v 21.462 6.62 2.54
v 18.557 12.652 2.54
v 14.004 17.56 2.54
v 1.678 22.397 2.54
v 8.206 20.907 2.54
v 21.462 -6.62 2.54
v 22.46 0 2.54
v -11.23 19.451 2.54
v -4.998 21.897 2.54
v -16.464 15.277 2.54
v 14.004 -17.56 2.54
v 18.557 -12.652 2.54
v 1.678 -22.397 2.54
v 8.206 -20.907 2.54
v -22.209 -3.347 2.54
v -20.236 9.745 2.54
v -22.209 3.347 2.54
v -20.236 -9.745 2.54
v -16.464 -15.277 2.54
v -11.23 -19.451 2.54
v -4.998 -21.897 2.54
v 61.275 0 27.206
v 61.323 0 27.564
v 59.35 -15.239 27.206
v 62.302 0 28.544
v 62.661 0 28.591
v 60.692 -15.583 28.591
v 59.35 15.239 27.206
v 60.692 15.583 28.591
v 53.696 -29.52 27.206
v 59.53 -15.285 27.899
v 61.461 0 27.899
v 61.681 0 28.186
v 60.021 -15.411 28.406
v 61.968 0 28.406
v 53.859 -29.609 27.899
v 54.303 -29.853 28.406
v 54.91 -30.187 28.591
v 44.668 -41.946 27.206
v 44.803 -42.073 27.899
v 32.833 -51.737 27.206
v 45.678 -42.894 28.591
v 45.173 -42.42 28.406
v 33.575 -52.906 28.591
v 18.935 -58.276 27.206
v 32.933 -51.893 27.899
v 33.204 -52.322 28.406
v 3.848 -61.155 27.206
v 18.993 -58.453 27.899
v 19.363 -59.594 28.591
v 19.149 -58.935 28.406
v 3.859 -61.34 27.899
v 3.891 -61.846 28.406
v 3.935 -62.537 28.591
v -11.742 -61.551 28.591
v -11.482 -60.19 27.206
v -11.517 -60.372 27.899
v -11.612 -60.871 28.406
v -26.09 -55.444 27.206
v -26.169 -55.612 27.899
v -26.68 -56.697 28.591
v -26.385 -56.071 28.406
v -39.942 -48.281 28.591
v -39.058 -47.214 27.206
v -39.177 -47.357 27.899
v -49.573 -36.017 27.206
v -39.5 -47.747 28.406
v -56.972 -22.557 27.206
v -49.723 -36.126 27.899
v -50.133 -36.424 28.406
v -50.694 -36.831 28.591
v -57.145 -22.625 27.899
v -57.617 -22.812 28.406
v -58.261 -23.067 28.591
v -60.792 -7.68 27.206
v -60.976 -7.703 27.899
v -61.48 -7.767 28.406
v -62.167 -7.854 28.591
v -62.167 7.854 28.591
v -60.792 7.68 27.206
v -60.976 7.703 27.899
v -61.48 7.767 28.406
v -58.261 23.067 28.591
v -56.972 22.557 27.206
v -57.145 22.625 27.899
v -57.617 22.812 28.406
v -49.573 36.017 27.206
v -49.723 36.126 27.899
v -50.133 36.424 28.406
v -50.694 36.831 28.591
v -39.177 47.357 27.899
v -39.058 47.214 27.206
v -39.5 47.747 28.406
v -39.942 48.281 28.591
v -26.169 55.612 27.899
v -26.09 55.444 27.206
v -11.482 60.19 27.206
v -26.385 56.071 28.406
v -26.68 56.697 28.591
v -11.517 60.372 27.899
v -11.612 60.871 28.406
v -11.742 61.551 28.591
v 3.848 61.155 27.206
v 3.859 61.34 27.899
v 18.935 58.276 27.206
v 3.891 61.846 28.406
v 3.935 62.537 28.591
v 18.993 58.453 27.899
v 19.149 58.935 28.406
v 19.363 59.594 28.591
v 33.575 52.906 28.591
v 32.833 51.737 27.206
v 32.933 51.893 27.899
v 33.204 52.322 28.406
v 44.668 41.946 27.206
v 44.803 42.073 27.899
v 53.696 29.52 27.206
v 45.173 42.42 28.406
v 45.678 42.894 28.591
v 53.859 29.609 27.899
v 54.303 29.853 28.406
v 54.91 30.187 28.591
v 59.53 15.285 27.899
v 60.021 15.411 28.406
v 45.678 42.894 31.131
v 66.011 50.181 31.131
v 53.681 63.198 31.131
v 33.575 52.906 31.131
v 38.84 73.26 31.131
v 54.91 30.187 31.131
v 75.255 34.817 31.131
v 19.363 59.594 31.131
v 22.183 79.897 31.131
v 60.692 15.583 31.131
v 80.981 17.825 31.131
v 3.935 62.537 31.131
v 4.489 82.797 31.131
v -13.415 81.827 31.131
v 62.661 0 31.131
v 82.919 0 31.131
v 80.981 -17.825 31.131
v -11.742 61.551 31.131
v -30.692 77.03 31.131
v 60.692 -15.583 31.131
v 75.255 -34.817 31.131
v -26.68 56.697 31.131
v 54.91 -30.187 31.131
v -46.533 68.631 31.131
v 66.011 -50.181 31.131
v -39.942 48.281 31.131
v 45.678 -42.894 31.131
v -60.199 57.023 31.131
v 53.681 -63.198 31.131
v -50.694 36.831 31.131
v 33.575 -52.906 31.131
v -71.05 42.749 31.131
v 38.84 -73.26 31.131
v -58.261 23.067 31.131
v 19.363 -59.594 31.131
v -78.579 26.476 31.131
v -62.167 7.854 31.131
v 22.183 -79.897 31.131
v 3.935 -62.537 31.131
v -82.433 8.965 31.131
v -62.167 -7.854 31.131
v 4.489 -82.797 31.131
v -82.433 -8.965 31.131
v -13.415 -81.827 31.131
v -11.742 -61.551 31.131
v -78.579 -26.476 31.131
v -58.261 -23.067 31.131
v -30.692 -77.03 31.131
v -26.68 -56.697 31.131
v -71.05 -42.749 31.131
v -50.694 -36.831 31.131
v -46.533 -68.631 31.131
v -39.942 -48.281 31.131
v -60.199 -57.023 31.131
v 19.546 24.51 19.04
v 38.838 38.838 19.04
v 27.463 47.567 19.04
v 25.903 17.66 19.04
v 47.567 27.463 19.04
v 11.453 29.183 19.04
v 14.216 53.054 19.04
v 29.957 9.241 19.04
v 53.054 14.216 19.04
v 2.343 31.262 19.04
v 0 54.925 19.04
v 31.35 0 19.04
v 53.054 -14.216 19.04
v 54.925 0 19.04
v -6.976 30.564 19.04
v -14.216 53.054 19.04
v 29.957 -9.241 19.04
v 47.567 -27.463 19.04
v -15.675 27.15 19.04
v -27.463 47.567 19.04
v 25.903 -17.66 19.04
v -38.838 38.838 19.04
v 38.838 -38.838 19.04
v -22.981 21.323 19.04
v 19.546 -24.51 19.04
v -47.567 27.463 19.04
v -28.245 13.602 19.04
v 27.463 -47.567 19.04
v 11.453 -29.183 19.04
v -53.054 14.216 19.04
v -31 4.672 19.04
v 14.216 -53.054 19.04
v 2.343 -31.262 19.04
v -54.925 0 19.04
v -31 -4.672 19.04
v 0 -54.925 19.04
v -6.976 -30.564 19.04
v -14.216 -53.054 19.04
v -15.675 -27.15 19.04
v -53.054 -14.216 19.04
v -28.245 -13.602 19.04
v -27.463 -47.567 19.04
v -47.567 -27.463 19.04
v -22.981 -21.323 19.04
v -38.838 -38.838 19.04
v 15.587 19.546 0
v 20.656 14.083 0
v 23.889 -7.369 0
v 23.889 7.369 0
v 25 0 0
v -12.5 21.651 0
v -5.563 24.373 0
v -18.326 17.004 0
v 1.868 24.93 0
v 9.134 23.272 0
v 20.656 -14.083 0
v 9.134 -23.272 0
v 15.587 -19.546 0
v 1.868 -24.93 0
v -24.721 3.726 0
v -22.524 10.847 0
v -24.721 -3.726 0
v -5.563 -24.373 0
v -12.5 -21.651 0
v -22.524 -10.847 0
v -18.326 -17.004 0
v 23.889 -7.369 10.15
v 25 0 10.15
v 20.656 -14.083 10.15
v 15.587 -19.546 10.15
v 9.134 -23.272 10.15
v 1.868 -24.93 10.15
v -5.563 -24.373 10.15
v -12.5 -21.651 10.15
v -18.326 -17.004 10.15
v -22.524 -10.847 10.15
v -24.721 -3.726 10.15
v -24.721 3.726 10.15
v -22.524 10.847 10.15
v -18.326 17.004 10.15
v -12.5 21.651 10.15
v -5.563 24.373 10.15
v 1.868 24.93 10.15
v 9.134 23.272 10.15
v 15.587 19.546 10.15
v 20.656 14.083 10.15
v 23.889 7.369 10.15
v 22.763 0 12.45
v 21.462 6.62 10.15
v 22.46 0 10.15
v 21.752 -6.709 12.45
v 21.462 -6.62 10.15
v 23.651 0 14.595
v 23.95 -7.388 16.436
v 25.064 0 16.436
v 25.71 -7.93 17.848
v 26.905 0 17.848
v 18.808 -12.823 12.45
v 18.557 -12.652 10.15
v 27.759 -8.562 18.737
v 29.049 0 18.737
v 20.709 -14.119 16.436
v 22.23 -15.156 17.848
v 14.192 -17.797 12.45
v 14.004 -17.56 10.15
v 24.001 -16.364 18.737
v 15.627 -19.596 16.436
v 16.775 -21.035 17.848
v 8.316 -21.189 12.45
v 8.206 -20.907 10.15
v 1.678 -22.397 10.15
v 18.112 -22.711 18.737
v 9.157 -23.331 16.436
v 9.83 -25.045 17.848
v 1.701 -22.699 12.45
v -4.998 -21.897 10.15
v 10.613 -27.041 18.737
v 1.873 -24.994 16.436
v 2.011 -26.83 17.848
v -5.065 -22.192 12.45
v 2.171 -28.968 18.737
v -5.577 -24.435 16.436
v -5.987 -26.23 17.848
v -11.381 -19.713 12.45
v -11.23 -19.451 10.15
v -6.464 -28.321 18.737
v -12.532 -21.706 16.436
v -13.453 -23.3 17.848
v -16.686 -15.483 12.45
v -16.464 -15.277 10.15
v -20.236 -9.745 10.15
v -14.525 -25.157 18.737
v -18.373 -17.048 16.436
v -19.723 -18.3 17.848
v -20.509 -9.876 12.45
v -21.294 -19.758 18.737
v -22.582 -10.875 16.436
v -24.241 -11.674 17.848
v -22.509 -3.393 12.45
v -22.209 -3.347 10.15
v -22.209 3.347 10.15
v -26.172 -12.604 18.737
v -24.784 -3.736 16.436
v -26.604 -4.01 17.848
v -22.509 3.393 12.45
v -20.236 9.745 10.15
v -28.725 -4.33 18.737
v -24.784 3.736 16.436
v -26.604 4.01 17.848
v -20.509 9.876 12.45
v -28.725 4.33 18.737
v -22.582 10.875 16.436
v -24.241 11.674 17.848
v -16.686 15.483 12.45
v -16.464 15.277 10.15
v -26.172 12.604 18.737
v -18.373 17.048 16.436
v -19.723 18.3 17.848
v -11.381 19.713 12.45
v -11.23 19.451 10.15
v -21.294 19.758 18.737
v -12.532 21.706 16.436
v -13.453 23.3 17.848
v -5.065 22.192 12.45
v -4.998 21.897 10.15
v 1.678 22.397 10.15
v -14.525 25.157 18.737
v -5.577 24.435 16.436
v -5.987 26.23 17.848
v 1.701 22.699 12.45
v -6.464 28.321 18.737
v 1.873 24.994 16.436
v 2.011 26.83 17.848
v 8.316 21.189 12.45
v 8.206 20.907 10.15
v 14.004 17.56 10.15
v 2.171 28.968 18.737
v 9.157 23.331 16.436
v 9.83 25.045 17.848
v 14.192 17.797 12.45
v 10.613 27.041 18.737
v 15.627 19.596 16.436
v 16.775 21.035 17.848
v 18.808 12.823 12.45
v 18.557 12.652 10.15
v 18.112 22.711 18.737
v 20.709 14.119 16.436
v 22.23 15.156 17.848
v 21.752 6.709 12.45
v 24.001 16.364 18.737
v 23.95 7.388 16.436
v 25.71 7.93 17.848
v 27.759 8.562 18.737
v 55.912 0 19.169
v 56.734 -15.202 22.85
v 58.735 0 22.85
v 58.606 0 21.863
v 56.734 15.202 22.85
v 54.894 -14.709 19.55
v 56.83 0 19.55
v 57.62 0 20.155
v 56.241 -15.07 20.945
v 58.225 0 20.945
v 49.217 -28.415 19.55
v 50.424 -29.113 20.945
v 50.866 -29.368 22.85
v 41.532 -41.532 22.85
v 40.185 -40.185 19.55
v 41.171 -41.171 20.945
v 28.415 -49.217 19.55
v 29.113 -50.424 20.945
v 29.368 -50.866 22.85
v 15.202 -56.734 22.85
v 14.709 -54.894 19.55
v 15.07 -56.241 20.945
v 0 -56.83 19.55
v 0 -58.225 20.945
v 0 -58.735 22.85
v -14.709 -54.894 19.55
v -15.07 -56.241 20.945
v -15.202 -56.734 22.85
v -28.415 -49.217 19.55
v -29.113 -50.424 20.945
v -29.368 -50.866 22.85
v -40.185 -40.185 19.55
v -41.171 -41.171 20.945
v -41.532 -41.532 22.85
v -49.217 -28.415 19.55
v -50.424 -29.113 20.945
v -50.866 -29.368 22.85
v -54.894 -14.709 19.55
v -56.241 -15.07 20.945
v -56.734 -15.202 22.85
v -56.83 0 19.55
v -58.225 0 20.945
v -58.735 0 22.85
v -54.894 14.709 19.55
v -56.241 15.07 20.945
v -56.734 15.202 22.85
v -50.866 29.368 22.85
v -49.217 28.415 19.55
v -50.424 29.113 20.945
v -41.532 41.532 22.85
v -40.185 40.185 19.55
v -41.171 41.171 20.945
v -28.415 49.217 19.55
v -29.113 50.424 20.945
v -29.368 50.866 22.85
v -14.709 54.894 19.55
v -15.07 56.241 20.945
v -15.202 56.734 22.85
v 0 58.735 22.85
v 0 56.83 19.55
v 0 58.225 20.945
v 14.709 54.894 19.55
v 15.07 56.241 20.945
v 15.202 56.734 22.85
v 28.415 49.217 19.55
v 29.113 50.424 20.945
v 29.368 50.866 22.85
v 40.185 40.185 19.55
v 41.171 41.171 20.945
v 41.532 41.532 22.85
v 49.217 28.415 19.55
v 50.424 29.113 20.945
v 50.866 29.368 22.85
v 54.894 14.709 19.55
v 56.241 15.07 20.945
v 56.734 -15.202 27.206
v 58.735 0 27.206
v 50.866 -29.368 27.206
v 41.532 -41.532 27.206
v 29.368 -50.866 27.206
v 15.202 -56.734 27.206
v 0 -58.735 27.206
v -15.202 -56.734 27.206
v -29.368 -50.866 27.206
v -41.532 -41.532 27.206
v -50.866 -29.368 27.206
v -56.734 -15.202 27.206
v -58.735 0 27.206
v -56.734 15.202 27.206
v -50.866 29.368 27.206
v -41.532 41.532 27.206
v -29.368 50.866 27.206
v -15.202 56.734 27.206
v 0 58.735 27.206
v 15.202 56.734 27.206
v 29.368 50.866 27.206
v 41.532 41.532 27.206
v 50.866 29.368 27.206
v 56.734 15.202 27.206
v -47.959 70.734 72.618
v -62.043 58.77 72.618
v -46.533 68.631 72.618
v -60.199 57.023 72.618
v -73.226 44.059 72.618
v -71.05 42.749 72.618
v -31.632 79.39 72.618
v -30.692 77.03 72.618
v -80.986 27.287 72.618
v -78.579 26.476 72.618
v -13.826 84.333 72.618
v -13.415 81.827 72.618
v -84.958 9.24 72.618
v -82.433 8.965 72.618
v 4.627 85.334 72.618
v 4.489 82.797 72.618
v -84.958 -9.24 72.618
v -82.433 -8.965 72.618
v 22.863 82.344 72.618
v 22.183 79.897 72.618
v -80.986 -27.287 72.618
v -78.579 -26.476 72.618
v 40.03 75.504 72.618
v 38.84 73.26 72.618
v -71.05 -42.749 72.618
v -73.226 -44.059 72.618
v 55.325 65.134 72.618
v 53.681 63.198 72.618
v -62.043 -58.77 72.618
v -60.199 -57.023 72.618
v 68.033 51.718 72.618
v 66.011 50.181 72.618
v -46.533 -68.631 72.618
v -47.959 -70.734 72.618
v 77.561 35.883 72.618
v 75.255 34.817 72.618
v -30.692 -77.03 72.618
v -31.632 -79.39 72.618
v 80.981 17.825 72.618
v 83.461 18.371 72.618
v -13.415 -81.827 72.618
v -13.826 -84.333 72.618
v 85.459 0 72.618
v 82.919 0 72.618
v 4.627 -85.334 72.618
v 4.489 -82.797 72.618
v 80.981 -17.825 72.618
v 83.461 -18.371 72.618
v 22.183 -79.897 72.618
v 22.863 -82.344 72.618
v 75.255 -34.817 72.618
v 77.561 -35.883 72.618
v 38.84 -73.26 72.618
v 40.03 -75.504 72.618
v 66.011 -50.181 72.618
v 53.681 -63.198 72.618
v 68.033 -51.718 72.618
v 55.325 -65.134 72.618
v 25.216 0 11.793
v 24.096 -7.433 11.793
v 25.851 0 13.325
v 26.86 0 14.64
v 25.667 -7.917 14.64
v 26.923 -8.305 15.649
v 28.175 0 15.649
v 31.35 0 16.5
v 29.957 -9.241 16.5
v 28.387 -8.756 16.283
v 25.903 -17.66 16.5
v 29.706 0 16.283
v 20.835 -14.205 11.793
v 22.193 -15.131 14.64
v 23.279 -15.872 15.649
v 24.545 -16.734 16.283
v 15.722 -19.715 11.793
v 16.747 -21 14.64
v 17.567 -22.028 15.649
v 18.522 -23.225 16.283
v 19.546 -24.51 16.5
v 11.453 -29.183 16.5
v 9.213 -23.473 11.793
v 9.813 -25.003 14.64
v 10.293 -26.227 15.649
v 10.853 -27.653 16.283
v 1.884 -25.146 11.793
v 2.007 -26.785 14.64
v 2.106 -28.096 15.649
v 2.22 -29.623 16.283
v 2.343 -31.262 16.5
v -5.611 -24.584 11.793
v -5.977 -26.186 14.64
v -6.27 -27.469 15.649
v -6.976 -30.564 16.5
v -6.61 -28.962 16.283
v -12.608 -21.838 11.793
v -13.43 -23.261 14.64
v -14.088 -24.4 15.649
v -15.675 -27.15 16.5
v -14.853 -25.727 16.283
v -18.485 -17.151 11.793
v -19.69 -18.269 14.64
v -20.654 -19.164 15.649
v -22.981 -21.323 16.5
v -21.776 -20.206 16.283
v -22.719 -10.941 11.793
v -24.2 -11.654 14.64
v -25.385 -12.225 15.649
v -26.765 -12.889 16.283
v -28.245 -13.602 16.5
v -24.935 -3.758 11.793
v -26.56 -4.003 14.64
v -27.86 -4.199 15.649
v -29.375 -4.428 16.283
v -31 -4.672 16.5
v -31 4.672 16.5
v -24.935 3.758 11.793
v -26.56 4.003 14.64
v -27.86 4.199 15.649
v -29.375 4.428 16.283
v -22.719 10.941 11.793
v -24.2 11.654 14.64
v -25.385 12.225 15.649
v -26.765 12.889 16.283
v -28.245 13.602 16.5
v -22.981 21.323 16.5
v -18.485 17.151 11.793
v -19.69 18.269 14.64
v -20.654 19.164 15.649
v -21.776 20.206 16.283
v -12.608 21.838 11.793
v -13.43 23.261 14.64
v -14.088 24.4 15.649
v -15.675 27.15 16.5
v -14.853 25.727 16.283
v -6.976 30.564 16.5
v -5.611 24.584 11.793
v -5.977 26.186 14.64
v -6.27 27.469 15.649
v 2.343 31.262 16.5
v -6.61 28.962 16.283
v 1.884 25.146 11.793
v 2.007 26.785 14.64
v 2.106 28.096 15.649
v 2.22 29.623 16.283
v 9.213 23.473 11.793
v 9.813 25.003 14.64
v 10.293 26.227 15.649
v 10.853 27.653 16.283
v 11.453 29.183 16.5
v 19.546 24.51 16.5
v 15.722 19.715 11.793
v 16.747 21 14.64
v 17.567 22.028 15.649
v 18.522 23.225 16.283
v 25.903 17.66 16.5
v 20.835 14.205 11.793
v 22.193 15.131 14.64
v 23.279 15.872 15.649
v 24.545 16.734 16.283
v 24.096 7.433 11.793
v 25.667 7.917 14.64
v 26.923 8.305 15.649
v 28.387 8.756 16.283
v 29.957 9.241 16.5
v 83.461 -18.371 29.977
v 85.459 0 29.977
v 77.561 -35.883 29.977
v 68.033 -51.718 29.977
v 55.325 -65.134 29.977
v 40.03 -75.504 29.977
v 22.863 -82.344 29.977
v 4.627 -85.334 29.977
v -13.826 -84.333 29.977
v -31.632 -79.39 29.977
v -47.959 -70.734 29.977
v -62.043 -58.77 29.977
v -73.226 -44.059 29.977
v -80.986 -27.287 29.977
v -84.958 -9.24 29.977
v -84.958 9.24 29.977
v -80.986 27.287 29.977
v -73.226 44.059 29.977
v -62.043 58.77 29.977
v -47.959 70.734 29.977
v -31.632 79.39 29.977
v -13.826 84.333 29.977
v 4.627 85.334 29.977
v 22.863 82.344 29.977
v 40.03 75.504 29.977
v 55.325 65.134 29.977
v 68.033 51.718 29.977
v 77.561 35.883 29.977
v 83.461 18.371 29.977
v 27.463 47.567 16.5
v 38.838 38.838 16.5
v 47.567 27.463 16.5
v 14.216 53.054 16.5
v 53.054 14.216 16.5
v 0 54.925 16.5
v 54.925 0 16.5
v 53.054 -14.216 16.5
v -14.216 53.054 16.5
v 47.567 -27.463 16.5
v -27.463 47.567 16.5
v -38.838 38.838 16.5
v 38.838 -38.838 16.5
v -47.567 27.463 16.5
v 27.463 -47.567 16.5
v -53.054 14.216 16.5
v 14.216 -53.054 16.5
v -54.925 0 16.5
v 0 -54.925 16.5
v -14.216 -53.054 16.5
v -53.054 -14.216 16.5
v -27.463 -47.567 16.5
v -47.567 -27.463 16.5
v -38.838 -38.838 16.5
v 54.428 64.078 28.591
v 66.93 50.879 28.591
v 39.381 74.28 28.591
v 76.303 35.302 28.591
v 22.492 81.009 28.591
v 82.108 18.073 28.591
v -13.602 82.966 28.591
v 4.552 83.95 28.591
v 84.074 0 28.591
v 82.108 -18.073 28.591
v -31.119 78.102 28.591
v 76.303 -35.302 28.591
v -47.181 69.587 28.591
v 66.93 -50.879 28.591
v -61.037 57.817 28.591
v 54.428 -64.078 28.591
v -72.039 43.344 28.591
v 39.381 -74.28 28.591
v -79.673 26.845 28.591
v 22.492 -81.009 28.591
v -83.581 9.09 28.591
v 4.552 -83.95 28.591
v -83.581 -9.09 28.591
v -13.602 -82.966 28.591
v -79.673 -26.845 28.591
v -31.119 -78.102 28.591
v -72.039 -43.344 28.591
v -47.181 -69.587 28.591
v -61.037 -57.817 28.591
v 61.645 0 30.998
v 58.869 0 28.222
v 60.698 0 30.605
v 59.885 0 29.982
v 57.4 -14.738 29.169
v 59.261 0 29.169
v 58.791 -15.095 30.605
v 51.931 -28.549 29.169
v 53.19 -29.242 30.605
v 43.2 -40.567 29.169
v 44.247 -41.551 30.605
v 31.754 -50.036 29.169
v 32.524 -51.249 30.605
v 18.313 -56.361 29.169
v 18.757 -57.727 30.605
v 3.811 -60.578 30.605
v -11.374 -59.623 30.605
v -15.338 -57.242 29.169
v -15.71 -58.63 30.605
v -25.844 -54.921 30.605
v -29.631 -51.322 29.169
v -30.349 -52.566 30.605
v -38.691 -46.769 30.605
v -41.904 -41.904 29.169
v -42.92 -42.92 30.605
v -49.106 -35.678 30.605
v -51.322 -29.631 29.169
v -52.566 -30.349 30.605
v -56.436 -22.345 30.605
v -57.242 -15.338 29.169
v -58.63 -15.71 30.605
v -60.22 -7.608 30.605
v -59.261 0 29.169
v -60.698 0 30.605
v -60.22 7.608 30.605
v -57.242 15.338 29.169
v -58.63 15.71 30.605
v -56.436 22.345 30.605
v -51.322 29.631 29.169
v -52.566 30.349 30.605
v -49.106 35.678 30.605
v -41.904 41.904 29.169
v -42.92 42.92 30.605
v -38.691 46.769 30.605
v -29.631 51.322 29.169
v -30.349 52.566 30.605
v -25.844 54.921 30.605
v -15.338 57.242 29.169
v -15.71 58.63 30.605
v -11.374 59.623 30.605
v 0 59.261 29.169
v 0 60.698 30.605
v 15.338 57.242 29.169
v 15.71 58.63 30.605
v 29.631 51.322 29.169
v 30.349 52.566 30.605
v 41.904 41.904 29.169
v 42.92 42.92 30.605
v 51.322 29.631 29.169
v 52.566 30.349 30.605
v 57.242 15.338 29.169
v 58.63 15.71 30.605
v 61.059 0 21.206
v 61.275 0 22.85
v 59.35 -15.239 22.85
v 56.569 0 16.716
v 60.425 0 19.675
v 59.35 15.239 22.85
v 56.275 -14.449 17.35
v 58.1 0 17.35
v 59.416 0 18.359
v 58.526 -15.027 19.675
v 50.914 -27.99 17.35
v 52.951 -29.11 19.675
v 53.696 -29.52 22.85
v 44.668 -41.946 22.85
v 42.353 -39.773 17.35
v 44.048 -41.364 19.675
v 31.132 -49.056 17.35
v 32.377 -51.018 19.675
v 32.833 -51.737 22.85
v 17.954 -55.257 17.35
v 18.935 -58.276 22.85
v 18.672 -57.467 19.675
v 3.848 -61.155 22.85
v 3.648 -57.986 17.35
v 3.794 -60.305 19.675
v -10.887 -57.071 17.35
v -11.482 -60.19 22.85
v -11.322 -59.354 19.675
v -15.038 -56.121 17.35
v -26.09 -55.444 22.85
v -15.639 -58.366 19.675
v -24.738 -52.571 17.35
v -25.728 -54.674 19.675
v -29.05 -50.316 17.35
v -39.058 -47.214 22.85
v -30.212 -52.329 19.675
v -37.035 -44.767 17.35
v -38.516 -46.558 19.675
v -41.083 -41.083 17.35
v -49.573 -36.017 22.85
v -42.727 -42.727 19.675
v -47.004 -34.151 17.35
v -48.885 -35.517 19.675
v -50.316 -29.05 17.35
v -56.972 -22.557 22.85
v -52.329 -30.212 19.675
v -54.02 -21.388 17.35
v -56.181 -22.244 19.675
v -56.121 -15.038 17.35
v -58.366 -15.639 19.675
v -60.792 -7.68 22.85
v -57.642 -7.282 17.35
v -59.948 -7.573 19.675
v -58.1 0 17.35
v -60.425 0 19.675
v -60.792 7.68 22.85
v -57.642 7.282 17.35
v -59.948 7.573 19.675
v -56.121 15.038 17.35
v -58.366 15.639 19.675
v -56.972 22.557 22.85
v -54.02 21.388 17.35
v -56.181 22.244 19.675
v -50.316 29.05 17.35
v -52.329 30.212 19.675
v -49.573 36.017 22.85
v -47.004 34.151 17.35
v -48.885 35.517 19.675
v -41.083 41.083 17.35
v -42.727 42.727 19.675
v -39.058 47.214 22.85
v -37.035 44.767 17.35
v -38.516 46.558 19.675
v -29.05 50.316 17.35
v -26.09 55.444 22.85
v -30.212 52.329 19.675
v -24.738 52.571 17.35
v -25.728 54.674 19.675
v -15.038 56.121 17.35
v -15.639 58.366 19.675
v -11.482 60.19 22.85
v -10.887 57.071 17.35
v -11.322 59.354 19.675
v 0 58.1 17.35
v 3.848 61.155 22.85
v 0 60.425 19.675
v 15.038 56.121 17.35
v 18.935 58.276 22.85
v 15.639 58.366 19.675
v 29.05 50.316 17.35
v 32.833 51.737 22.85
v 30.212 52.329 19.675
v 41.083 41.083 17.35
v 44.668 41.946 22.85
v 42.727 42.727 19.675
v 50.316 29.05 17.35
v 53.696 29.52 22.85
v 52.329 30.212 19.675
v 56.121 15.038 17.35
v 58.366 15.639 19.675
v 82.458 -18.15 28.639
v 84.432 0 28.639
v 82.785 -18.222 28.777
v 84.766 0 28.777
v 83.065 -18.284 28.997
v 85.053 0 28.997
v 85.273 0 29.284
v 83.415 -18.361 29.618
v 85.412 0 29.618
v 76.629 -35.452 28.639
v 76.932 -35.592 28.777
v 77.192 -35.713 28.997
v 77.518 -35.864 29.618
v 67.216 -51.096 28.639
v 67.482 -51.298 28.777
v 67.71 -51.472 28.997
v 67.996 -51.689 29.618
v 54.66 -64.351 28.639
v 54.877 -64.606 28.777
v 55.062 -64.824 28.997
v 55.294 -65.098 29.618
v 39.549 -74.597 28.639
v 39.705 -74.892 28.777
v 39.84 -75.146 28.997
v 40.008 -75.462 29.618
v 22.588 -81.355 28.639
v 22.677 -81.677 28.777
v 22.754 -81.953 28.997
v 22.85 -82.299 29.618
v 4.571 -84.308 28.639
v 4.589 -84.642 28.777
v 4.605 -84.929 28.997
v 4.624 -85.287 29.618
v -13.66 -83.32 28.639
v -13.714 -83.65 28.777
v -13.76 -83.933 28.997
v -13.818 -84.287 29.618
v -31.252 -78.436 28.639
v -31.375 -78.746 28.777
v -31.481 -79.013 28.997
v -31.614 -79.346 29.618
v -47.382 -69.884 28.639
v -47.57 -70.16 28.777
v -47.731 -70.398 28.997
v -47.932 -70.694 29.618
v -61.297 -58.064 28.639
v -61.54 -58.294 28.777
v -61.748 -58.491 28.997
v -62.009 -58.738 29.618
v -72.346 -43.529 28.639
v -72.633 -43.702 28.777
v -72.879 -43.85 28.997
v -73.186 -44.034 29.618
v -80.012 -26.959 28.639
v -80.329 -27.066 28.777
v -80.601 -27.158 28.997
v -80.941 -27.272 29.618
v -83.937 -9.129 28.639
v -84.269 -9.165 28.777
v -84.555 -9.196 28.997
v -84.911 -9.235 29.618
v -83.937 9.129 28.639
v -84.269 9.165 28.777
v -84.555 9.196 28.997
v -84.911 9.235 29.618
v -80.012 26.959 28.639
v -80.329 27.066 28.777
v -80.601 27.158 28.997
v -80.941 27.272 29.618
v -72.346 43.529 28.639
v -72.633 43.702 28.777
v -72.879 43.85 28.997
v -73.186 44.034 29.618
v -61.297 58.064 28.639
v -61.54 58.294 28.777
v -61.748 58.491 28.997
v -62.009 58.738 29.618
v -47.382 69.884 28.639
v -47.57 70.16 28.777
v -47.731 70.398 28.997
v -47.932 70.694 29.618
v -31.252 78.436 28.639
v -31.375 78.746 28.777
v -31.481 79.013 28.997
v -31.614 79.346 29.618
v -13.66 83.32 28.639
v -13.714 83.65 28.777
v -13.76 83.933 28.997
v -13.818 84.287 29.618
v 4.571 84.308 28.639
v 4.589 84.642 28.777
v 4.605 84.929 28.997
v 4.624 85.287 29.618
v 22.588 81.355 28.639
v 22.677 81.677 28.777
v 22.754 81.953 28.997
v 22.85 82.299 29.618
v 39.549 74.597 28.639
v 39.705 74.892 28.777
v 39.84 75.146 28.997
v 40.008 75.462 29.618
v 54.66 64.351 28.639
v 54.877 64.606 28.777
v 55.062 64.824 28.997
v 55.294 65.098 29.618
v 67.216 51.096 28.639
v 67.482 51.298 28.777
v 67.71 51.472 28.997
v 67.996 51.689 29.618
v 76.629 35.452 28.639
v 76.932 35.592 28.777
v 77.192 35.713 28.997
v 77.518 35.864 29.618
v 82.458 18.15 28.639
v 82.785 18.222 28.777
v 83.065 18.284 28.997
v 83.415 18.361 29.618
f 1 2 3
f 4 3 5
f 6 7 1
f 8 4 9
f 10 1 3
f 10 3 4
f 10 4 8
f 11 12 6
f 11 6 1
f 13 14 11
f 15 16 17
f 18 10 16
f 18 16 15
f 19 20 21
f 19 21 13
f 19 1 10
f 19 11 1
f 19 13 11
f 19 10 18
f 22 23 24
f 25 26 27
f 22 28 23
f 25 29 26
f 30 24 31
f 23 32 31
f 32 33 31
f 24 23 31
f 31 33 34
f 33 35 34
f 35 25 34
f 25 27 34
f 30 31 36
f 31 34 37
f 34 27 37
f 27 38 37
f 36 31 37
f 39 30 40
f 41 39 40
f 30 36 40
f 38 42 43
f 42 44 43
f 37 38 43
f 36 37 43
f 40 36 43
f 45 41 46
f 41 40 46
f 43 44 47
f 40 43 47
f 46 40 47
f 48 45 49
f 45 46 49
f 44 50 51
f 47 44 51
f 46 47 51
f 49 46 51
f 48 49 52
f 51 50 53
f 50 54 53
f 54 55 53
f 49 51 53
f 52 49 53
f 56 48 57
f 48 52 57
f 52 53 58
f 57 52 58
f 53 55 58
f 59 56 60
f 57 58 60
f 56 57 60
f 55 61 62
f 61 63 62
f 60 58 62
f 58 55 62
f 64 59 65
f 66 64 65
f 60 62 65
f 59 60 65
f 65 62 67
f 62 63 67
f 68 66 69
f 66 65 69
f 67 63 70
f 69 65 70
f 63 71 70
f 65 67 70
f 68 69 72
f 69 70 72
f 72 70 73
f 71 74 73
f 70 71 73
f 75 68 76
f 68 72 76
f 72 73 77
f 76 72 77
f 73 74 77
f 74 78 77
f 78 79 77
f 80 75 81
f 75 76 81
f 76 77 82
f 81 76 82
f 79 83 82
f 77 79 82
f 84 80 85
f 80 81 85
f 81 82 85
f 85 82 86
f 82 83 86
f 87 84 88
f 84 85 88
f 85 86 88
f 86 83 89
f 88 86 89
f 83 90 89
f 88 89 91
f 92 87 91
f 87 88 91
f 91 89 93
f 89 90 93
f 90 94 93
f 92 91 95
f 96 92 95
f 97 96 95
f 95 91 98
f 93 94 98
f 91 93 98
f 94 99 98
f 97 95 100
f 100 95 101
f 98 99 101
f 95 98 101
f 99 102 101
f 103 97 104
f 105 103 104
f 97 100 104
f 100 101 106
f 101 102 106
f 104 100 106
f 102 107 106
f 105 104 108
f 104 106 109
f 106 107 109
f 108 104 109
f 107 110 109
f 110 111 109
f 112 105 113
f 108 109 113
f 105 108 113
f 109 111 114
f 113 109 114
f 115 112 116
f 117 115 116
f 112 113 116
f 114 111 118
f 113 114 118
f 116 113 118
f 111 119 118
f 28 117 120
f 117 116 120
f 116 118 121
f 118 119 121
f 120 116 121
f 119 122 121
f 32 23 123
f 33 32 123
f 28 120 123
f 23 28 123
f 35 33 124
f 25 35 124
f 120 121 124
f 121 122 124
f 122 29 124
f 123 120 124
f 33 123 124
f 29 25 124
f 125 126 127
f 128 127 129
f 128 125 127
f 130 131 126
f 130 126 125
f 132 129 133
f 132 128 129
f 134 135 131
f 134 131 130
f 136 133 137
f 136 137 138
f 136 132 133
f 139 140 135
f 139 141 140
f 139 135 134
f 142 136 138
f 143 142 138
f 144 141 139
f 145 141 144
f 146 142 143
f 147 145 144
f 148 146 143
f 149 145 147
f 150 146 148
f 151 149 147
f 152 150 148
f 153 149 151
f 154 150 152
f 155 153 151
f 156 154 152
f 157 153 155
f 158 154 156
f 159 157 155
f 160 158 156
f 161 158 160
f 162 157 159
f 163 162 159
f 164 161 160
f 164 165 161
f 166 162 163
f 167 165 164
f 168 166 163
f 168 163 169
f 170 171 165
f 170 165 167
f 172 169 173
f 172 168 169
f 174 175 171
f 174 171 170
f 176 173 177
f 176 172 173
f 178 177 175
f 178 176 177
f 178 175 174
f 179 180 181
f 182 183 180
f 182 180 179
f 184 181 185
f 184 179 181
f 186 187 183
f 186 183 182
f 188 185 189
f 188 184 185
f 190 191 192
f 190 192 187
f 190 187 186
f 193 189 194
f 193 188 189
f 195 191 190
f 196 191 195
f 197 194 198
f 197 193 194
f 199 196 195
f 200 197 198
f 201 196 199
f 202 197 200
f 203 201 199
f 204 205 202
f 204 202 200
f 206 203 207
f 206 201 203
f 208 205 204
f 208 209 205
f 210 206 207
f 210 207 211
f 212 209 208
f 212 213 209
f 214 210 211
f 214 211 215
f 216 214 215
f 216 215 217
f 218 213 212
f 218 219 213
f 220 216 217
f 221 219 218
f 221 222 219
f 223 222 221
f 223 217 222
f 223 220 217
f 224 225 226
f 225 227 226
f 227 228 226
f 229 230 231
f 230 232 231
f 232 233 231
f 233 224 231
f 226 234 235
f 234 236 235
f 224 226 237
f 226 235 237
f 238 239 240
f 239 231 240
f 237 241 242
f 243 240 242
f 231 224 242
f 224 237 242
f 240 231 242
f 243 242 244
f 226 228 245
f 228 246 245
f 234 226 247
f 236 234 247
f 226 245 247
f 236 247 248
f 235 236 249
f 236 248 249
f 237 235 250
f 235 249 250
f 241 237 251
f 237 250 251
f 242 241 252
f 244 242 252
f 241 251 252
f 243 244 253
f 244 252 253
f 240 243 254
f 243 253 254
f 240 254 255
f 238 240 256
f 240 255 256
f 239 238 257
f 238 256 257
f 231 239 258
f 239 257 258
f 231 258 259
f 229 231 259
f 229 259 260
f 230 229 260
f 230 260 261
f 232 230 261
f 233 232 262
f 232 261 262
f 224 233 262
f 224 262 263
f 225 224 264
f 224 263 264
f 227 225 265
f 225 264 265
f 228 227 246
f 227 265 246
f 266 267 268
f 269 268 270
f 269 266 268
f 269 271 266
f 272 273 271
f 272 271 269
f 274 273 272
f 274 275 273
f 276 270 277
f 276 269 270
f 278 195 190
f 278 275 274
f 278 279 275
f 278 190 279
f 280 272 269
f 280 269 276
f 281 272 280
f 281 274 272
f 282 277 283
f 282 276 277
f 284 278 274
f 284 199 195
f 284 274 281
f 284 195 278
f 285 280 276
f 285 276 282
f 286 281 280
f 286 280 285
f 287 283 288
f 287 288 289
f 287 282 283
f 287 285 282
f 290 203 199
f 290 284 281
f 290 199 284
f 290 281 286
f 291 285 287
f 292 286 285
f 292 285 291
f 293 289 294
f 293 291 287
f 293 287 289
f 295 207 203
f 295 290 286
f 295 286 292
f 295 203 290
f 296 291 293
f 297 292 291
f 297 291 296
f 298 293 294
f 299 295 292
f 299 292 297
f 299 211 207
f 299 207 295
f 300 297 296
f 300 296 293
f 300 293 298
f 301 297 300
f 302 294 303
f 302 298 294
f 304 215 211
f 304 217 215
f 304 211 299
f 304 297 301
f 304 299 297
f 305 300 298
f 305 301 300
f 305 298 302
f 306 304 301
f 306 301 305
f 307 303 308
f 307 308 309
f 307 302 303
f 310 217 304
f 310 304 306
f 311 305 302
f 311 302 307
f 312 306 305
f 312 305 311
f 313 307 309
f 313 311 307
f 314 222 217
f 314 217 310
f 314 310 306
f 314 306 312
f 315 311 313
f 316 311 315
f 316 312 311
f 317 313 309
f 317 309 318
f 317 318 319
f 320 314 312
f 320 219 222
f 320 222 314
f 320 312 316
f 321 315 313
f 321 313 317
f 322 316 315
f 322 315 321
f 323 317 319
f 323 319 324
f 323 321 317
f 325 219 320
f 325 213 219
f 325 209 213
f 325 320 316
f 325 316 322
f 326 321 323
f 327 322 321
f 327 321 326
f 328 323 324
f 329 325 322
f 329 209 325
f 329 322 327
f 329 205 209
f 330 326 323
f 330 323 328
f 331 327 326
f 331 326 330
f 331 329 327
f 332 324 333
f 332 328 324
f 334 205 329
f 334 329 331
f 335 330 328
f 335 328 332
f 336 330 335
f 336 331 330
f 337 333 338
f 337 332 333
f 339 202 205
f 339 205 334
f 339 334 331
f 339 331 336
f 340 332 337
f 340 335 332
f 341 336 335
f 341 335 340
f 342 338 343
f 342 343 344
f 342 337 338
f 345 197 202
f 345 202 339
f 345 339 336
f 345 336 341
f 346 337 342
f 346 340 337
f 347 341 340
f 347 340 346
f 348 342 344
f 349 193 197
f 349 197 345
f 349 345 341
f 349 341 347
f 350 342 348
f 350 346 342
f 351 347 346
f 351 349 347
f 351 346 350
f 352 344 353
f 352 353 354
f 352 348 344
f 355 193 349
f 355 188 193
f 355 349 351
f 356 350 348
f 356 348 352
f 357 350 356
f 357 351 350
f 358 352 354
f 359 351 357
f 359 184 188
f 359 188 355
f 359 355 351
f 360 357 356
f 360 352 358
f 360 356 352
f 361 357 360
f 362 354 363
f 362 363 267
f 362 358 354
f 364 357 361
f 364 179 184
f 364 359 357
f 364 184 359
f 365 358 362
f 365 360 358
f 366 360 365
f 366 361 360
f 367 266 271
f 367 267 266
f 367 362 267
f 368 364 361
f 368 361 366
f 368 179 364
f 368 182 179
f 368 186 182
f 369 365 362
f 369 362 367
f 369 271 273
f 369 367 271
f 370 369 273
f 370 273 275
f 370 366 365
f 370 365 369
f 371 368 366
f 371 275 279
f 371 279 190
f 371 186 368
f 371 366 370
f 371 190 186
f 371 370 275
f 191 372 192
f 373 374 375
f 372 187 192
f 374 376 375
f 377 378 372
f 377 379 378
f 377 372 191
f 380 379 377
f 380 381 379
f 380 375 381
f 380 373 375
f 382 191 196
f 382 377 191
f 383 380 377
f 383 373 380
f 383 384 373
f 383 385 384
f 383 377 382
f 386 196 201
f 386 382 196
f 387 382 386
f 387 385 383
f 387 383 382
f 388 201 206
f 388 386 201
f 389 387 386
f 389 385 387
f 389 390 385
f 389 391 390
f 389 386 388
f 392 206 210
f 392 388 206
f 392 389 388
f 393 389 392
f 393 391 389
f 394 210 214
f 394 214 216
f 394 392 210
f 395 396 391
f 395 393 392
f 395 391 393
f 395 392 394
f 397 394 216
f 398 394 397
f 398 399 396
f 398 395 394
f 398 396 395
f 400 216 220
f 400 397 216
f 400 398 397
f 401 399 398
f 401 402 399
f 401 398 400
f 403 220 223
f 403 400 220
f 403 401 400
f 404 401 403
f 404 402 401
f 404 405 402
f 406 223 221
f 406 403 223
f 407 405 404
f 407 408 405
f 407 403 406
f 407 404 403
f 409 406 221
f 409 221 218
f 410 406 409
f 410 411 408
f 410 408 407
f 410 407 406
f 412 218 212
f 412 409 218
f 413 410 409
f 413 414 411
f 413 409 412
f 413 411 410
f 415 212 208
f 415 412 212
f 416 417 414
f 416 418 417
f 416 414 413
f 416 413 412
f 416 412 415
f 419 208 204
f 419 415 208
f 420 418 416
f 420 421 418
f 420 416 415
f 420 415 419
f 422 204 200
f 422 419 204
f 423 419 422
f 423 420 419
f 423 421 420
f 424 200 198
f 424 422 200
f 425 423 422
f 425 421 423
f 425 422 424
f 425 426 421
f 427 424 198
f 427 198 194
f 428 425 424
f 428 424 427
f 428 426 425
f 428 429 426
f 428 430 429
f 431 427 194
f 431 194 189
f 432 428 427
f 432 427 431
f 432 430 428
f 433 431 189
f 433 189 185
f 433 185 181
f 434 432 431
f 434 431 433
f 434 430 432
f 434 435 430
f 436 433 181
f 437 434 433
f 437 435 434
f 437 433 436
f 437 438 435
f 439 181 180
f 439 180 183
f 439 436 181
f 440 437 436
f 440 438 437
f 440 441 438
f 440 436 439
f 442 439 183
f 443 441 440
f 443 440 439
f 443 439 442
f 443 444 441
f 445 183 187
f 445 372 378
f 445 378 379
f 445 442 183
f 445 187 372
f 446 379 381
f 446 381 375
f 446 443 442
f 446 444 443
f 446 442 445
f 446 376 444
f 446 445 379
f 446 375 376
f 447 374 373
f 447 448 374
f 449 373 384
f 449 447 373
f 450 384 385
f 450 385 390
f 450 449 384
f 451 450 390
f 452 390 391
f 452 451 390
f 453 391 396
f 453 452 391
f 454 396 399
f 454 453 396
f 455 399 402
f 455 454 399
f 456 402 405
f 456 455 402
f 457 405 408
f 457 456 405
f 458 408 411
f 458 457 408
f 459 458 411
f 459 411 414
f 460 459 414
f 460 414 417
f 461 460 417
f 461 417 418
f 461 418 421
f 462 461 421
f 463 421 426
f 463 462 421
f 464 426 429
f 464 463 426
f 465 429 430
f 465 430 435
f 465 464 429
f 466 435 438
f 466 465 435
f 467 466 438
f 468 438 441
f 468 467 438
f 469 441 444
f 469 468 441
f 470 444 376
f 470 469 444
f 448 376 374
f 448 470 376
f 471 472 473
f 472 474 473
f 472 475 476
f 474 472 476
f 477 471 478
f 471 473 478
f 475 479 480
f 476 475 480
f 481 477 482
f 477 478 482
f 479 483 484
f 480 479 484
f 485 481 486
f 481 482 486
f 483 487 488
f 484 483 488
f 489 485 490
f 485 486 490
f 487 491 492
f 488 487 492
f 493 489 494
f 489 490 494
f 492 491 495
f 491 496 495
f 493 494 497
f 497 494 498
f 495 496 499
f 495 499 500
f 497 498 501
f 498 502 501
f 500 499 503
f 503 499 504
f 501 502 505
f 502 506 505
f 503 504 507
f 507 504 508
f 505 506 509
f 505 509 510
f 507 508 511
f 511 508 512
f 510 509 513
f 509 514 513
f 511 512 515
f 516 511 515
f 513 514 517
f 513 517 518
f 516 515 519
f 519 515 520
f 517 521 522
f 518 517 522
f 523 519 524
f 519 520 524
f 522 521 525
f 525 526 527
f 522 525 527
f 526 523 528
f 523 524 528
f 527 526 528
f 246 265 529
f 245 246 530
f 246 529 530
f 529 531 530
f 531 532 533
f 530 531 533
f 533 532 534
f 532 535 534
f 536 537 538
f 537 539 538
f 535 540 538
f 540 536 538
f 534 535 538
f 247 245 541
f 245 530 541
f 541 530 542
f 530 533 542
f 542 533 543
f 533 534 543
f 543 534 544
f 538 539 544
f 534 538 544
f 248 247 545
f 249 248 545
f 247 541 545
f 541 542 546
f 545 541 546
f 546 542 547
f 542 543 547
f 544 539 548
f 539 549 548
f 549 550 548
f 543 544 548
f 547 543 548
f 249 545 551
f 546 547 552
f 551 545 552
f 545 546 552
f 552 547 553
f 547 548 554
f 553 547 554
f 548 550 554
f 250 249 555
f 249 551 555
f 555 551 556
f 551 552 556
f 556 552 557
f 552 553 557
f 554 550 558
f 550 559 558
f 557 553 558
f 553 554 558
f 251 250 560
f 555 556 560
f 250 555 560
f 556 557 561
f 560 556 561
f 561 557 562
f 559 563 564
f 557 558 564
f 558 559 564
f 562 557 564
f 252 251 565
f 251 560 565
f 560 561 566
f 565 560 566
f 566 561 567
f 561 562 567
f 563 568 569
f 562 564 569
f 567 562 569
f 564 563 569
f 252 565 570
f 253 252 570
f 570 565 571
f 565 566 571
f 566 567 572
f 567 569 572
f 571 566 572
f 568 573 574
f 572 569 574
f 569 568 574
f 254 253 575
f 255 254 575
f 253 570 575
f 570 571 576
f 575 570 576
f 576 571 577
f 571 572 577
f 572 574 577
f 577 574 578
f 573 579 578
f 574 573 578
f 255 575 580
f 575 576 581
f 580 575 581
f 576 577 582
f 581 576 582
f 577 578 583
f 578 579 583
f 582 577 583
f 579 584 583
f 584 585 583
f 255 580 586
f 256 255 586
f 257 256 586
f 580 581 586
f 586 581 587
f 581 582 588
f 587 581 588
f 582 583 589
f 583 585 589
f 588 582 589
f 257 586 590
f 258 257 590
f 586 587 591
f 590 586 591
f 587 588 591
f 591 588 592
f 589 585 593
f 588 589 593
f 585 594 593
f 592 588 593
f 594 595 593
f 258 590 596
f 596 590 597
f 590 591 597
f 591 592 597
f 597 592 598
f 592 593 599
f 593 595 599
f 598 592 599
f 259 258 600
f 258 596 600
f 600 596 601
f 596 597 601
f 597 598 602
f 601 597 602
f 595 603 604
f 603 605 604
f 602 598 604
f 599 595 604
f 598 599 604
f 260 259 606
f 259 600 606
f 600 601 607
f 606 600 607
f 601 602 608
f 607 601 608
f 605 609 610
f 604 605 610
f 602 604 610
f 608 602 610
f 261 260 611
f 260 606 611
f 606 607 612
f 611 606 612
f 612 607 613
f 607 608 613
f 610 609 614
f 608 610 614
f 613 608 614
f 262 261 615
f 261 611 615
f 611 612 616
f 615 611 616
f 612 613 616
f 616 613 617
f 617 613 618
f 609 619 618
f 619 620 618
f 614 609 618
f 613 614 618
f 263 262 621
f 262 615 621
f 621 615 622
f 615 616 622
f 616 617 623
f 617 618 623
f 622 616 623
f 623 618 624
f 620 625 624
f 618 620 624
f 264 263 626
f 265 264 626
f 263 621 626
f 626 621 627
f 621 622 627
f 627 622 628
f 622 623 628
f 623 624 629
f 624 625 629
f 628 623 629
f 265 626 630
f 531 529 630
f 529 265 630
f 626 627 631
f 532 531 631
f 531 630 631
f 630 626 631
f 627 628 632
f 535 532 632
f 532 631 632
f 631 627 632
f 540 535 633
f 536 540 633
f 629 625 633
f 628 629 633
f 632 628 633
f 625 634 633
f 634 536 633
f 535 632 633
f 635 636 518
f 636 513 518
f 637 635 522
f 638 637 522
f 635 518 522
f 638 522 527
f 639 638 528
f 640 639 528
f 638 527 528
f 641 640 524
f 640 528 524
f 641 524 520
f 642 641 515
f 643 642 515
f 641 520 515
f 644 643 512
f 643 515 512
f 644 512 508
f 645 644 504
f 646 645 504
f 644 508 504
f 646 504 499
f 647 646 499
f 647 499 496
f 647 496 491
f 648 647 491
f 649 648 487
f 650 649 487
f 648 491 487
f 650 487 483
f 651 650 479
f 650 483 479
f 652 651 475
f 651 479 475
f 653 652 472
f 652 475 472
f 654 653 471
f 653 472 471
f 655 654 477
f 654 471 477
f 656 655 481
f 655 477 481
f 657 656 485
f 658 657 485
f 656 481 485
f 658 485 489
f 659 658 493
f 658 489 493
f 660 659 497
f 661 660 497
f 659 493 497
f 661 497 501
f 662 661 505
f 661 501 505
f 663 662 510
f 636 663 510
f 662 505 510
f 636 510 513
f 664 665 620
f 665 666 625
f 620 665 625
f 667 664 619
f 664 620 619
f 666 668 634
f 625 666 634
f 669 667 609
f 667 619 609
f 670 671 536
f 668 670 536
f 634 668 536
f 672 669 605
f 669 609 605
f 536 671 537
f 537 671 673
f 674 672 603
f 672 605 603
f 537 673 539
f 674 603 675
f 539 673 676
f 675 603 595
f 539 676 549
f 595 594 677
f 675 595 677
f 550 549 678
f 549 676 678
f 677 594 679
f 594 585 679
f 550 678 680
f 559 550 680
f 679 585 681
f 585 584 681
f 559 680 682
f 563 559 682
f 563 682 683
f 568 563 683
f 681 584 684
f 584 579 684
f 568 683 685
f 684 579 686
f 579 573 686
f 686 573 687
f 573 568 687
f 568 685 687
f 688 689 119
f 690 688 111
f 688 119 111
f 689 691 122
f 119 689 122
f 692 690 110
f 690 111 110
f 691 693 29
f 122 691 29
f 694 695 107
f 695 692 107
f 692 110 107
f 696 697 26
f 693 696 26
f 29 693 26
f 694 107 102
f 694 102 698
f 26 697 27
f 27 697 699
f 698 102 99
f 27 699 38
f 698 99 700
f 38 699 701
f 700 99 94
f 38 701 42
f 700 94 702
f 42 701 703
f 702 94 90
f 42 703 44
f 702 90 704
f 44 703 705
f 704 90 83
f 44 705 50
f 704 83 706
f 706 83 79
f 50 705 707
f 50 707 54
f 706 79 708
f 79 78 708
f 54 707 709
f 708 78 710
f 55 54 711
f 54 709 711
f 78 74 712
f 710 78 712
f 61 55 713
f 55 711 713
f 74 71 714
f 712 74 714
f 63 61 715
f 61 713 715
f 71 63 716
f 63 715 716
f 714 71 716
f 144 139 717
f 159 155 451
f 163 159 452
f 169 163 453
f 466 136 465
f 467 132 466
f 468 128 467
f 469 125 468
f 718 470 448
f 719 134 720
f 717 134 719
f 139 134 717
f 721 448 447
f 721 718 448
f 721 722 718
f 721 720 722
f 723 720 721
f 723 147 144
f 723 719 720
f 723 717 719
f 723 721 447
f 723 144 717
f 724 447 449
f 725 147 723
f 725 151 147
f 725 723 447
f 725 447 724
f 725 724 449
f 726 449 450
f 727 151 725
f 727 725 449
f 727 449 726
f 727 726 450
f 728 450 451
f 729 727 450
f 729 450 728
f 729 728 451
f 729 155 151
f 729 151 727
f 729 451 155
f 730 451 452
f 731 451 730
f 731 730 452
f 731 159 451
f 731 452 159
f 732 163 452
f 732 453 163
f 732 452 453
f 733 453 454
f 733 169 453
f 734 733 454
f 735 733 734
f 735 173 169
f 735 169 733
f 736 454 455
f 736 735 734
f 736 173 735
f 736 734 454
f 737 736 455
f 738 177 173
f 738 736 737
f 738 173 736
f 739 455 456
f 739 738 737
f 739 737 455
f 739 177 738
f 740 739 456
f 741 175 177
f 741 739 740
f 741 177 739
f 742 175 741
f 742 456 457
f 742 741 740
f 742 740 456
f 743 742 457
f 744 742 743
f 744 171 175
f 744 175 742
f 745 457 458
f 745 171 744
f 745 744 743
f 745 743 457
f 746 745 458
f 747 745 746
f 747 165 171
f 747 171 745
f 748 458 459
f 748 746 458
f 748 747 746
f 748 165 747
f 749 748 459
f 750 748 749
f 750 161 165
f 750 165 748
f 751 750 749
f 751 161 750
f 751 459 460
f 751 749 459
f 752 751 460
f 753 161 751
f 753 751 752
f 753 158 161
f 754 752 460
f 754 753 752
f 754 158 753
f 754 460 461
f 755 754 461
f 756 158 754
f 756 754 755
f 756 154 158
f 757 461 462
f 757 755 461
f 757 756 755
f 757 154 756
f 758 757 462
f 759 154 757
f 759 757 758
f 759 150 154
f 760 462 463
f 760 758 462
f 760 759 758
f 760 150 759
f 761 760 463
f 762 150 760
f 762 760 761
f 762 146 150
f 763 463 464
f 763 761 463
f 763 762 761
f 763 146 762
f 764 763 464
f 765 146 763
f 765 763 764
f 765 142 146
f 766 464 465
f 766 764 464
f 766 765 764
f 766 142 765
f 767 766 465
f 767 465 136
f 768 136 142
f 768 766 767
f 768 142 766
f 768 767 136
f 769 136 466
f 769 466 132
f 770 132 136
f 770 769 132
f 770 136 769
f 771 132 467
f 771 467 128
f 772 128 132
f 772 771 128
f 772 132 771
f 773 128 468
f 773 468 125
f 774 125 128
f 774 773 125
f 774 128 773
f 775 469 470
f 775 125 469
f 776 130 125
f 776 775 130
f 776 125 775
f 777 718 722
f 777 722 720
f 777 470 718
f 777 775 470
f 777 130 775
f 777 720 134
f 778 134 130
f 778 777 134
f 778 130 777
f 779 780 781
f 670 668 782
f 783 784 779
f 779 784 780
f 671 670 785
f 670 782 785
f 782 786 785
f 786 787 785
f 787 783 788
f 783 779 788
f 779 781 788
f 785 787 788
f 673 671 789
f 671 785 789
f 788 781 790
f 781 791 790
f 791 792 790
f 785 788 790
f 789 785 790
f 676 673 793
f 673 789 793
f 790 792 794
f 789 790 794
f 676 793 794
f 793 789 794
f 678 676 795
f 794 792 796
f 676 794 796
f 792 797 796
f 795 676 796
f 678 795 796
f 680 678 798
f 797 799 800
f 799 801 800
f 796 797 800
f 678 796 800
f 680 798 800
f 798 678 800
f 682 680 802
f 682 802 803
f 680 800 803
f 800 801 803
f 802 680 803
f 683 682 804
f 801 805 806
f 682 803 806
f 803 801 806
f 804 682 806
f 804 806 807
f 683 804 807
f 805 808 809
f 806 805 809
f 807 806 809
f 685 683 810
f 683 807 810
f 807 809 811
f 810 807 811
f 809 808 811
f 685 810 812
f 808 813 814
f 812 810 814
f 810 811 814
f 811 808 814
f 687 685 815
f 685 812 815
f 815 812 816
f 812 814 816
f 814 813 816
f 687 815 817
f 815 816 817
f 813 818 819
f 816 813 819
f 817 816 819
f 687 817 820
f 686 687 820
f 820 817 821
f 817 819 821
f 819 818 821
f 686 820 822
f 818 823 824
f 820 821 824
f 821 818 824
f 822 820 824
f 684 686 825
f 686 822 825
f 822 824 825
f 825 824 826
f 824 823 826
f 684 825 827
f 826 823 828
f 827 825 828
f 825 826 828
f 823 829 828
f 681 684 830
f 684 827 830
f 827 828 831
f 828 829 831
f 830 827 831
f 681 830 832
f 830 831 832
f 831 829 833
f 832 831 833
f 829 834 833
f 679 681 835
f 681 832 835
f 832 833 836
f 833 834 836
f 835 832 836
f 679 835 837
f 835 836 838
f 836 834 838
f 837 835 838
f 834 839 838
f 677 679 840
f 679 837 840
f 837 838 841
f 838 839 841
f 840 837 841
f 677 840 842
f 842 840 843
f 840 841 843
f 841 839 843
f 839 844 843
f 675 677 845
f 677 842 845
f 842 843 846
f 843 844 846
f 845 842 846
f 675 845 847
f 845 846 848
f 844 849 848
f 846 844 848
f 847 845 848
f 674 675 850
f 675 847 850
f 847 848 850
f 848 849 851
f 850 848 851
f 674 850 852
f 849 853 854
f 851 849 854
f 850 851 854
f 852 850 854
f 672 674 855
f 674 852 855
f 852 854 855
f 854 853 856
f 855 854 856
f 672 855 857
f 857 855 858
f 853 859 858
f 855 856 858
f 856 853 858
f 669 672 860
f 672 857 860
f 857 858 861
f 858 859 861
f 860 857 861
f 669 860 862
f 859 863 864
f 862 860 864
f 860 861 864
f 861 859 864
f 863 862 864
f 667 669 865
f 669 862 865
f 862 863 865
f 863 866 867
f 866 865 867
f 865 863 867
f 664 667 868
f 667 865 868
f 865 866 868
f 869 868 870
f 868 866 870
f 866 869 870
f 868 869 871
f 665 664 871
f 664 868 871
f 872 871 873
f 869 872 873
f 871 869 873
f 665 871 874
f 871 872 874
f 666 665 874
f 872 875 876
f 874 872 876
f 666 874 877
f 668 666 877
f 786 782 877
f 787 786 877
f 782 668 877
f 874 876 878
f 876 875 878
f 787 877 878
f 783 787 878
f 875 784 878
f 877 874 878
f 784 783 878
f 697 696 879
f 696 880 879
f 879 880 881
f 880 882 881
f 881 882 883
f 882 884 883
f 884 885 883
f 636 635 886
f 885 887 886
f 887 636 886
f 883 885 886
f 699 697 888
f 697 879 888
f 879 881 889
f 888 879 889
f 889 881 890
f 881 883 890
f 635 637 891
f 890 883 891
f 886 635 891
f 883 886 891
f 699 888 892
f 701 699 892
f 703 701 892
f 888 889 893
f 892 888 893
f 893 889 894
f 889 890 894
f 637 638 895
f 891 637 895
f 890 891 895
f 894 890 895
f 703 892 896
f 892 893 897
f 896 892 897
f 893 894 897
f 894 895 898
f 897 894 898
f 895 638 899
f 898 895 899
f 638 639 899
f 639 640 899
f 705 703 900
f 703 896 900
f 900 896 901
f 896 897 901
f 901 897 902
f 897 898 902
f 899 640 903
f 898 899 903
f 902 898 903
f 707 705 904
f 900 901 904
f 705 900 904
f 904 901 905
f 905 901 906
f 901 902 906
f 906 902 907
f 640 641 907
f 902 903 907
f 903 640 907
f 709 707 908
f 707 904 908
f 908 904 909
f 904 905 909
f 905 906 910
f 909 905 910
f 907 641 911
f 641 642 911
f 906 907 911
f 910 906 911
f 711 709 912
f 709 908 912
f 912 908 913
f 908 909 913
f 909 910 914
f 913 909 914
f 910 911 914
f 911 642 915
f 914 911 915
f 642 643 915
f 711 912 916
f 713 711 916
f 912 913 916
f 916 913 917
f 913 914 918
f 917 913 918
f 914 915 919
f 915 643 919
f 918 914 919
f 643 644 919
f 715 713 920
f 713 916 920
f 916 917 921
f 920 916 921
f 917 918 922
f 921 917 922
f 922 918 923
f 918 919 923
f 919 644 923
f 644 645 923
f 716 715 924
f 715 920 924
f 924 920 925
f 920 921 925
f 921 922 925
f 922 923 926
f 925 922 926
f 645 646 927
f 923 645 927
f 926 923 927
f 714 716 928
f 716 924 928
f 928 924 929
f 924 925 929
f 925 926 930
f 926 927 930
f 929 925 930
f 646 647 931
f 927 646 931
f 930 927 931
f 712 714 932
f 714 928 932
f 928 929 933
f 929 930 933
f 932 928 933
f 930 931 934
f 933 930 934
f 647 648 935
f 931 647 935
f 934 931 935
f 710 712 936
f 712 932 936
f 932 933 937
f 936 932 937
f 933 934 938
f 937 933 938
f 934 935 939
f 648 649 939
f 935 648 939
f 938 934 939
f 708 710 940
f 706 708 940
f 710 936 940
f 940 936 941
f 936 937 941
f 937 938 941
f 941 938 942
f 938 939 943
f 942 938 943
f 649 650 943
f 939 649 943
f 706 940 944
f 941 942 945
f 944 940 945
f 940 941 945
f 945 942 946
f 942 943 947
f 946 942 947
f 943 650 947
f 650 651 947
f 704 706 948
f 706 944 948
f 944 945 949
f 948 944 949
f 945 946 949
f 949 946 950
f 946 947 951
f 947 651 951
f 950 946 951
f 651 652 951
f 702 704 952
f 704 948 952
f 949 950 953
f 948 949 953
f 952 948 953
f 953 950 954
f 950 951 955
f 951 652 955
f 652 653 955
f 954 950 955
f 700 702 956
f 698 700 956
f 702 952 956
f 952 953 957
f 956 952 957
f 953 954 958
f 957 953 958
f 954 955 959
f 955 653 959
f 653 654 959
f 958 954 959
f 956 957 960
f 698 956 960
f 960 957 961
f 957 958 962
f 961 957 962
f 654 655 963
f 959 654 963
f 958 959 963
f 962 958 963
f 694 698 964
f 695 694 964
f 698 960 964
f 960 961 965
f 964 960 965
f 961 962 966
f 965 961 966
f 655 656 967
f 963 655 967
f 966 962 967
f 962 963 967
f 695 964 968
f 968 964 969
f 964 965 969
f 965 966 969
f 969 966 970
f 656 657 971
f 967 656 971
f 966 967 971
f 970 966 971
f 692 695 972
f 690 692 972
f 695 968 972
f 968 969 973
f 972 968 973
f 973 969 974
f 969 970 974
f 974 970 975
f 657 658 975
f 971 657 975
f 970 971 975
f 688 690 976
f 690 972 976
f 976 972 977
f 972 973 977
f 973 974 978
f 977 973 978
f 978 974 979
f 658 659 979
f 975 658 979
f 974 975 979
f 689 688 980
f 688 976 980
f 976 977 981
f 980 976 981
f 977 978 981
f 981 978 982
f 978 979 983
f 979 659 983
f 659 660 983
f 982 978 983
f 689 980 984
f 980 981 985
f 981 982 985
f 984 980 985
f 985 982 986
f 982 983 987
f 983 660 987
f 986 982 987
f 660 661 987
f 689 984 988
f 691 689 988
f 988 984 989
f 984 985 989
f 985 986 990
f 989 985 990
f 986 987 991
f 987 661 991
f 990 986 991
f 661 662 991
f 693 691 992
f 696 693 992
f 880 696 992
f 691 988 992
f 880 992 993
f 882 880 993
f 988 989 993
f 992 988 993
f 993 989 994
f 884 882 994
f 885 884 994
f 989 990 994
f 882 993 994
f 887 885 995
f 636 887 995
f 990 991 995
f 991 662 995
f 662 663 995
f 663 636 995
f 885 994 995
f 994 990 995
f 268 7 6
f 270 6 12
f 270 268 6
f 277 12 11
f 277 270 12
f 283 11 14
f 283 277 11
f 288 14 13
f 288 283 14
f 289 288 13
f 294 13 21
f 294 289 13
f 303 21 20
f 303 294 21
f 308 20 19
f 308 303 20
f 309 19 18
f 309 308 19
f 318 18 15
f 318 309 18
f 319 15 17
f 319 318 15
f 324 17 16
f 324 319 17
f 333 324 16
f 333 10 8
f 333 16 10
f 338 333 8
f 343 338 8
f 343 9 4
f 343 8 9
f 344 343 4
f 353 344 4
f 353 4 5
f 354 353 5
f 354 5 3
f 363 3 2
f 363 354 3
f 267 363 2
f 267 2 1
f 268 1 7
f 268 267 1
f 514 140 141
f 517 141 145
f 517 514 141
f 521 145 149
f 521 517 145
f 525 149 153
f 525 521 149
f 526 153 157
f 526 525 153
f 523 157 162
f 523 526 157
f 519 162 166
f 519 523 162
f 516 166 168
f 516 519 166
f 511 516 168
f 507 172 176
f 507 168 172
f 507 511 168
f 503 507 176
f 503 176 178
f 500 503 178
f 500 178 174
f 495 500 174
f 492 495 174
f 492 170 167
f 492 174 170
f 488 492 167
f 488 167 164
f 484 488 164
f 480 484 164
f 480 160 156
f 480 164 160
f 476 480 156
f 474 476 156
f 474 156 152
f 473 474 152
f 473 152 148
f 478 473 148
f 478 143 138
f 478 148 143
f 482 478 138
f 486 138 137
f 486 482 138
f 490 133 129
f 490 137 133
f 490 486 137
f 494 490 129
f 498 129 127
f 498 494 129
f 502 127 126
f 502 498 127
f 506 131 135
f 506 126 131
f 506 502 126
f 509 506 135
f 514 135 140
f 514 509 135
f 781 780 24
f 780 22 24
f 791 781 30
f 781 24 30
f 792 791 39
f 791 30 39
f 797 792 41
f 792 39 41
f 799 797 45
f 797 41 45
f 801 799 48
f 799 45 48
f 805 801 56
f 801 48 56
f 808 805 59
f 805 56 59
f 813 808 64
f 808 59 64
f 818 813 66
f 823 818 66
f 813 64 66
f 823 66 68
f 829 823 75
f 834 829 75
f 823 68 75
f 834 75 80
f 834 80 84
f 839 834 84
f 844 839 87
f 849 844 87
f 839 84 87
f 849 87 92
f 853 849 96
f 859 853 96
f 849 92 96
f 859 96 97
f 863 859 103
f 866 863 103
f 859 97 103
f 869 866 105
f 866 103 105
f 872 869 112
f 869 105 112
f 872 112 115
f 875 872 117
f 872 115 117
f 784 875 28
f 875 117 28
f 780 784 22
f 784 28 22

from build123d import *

# Parameters (mm, degrees)
F2_T = -2.54


with BuildPart() as f1:
    # F0 (on Front) → F1 (revolve)
    with BuildSketch(Plane.XZ):
        with BuildLine():
            Line((0, 72.617948), (0, 0))
            Line((0, 0), (25, 0))
            Line((25, 0), (25, 10.149501))
            ThreePointArc((25, 10.149501), (26.859872, 14.639629), (31.35, 16.499501))
            Line((31.35, 16.499501), (54.925465, 16.499501))
            ThreePointArc((54.925465, 16.499501), (59.415593, 18.359373), (61.275465, 22.849501))
            Line((61.275465, 22.849501), (61.275465, 27.205774))
            ThreePointArc((61.275465, 27.205774), (61.681282, 28.185503), (62.661011, 28.59132))
            Line((62.661011, 28.59132), (84.073557, 28.59132))
            ThreePointArc((84.073557, 28.59132), (85.053286, 28.997137), (85.459103, 29.976866))
            Line((85.459103, 29.976866), (85.459103, 72.617948))
            Line((85.459103, 72.617948), (0, 72.617948))
        make_face()
    revolve(axis=Axis((0, 0, 36.308974), (0, 0, -1)))

    # F2
    f2_openings = [f1.faces().sort_by_distance(p)[0] for p in [
        (0, 0, 72.617948),
    ]]
    offset(amount=F2_T, openings=f2_openings)


solid = f1.part
